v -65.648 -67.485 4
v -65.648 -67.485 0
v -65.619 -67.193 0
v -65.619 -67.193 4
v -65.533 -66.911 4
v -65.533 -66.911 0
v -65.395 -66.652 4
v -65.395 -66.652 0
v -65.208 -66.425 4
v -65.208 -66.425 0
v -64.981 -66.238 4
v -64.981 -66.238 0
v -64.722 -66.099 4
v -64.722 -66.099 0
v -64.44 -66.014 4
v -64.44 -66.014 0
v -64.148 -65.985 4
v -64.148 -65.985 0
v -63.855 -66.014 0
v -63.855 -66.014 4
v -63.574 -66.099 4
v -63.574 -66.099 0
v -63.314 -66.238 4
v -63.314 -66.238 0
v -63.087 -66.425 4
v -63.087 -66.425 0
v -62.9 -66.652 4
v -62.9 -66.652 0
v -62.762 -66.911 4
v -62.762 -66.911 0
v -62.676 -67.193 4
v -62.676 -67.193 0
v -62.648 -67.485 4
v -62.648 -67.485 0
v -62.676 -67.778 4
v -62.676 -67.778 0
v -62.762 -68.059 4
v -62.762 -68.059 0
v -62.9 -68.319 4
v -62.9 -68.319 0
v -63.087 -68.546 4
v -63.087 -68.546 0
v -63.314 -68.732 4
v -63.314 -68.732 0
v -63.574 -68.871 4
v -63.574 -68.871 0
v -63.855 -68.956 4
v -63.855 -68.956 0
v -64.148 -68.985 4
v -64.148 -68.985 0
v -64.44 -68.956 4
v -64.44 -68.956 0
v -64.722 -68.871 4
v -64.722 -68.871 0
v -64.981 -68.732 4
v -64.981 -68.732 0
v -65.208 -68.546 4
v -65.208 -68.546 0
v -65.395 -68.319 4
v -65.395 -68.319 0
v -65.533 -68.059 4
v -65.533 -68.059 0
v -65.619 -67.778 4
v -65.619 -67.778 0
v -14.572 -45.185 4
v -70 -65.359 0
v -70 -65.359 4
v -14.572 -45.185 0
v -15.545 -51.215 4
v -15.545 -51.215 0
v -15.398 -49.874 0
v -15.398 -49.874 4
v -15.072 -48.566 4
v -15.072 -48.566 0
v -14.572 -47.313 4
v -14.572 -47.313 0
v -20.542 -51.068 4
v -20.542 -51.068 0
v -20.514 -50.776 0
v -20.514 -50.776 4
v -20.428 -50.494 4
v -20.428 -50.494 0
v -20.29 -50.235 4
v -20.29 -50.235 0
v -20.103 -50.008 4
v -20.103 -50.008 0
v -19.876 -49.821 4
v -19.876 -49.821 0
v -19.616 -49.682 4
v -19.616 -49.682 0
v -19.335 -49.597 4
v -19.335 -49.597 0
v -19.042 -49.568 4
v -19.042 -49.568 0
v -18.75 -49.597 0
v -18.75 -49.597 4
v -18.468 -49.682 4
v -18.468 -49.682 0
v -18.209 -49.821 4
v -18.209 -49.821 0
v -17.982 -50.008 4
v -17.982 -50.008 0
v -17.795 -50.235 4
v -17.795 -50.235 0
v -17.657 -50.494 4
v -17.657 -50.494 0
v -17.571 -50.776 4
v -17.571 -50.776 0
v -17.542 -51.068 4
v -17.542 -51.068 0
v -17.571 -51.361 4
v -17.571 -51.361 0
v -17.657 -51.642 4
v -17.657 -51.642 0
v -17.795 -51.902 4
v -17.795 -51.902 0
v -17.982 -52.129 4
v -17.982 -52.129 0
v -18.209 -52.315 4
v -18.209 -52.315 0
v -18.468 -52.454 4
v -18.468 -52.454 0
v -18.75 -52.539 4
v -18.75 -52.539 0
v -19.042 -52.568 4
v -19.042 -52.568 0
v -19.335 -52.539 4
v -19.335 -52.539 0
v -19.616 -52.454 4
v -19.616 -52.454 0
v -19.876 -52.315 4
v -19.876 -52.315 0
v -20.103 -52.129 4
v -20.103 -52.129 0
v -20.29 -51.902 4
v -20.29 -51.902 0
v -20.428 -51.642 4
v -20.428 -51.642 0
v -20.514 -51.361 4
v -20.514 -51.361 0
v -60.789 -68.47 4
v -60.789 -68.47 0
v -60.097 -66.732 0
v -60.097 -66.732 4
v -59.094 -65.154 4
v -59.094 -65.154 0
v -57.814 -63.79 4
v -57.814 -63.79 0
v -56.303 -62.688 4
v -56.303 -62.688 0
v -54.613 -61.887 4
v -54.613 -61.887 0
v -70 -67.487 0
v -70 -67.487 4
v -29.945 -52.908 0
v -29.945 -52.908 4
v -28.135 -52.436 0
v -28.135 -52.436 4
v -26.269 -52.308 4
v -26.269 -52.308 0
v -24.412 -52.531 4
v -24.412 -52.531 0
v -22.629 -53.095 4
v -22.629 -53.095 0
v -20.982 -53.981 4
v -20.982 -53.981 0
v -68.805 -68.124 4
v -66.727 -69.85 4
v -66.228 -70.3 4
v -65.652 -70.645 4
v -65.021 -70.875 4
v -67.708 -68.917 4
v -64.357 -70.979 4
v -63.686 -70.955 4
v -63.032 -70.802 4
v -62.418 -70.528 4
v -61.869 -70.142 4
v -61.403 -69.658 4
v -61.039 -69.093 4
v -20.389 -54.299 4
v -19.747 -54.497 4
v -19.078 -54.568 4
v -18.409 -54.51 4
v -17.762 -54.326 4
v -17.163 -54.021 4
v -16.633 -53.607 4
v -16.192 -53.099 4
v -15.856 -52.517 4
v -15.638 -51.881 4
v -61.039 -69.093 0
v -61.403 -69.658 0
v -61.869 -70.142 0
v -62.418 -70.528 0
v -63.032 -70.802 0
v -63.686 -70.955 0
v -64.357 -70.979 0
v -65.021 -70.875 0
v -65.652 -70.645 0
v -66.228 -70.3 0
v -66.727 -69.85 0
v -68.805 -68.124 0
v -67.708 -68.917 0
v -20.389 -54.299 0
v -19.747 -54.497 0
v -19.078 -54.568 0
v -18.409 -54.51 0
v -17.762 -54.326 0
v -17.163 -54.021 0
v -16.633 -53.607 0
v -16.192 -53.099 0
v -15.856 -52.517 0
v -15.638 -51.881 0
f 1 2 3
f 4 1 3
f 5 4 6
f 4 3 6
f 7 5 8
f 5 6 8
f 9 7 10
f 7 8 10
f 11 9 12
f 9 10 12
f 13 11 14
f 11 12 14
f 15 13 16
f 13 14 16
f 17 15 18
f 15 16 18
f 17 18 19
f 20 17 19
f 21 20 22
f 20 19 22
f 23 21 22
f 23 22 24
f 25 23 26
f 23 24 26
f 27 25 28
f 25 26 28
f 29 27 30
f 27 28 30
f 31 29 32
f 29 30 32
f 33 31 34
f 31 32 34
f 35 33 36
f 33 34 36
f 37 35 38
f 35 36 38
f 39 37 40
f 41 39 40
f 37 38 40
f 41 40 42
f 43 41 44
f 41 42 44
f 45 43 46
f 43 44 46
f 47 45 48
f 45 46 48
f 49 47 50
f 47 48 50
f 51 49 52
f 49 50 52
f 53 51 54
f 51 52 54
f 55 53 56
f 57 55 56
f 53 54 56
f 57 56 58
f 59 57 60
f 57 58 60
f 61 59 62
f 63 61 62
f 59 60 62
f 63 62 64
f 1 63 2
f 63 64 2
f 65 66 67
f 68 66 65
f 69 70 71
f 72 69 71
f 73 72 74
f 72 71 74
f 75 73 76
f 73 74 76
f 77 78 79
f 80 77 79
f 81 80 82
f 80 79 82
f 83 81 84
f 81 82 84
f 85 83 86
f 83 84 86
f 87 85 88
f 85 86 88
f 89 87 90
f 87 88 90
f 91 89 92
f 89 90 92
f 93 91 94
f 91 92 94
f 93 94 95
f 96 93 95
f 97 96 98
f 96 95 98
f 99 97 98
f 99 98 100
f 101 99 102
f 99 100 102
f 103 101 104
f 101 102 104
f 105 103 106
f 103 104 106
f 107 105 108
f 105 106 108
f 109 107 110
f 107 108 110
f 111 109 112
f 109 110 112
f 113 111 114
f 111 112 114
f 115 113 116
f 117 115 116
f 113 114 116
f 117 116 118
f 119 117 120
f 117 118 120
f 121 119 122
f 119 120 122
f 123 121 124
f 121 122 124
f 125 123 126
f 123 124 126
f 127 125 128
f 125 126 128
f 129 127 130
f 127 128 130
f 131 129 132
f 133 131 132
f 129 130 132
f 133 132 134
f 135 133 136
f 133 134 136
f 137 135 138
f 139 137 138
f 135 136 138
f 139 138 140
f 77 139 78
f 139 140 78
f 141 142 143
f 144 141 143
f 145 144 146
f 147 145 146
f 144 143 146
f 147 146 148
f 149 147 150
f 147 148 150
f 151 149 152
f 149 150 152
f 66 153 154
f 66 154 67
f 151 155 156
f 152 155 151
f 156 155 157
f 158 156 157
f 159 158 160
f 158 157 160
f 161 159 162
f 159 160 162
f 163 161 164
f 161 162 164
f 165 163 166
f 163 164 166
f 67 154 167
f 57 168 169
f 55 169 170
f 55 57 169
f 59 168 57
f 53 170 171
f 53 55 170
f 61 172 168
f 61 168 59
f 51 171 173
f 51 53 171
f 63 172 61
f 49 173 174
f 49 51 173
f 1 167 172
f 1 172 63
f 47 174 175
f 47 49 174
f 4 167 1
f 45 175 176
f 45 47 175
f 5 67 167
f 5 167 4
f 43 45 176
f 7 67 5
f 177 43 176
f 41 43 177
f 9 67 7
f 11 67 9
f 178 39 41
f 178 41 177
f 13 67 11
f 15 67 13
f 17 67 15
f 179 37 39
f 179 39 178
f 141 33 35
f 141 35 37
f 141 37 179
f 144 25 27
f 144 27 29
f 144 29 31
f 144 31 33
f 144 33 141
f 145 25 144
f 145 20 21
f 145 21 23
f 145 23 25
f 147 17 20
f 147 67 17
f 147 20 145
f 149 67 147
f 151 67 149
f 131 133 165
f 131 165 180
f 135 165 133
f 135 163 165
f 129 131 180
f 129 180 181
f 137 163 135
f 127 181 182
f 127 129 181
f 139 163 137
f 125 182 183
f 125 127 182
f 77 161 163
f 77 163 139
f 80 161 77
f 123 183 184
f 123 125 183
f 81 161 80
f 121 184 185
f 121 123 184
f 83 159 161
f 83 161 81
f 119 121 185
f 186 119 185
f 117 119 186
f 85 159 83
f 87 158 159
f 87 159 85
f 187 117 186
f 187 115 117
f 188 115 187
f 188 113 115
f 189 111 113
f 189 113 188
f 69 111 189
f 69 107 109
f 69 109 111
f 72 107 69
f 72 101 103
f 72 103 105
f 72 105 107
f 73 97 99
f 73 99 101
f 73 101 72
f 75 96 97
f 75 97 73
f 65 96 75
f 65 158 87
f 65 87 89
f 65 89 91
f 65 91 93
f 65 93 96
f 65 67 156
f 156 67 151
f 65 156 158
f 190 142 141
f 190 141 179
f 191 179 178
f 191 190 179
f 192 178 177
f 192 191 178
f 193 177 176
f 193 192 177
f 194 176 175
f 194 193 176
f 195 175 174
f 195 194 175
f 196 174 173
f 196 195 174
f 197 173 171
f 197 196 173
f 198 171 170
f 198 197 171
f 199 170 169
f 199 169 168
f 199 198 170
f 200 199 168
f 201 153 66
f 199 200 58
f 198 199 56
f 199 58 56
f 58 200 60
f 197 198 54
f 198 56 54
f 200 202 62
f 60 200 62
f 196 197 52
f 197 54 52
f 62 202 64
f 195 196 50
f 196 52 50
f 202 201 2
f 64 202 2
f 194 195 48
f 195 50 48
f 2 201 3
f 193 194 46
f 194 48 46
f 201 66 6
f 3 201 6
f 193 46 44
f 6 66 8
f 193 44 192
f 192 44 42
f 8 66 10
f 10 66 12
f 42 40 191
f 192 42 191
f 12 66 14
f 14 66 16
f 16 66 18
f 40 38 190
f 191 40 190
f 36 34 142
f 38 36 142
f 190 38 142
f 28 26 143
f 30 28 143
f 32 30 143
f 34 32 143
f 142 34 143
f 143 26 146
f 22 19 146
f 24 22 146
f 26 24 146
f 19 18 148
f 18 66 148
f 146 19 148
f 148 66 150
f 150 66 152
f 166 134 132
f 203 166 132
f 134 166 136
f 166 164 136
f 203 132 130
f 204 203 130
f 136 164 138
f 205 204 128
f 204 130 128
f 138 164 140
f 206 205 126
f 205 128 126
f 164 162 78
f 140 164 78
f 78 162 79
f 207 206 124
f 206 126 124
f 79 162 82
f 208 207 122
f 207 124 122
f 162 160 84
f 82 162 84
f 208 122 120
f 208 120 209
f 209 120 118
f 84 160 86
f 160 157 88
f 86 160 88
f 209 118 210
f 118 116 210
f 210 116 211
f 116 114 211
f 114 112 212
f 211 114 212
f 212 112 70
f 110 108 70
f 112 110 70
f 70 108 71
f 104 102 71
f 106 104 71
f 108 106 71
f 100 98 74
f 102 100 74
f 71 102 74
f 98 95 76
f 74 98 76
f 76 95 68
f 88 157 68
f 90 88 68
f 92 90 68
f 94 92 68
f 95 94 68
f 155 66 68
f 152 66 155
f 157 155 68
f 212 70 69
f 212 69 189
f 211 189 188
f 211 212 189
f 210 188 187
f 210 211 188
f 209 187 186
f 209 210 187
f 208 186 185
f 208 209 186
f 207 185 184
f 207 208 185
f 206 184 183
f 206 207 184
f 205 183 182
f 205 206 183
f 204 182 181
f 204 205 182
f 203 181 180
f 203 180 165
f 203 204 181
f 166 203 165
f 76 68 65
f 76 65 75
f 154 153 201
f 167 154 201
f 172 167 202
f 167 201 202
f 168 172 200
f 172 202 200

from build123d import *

# Parameters (mm, degrees)
BOSS_EXTRUDE1_DEPTH = 4
SKETCH2_R           = 1.5
BOSS_EXTRUDE2_DEPTH = 4
FILLET1_DEPTH       = 4


with BuildPart() as part:
    # Sketch1 → Boss-Extrude1 (new body)
    with BuildSketch(Plane.XY):
        Polygon((-70, -65.358547654), (-14.572335871, -45.184527756), (-14.572335871, -47.312883301), (-70, -67.486903199), align=None)
    extrude(amount=BOSS_EXTRUDE1_DEPTH)

    # Sketch2 → Boss-Extrude2 (add)
    # profile 1 of 6: a face of its own
    with BuildSketch(Plane(origin=(0, 0, 0), x_dir=(-1, 0, 0), z_dir=(0, 0, -1))):
        with BuildLine():
            ThreePointArc((15.753480329, -49.871140271), (17.845334, -54.357134945), (22.331328674, -52.265281274))
            ThreePointArc((22.331328674, -52.265281274), (22.489231637, -51.675979394), (22.542404501, -51.068210772))
            ThreePointArc((22.542404501, -51.068210772), (22.513056924, -50.615914674), (22.425506352, -50.171203601))
            Line((22.425506352, -50.171203601), (17.027383224, -48.206447461))
            ThreePointArc((17.027383224, -48.206447461), (16.262879385, -48.941184649), (15.753480329, -49.871140271))
        make_face()
        with Locations((19.042404501, -51.068210772)):
            Circle(SKETCH2_R, mode=Mode.SUBTRACT)
    # profile 2 of 6: a face of its own
    with BuildSketch(Plane(origin=(0, 0, 0), x_dir=(-1, 0, 0), z_dir=(0, 0, -1))):
        with BuildLine():
            Line((16.437520615, -47.991755029), (15.753480329, -49.871140271))
            ThreePointArc((15.753480329, -49.871140271), (16.262879385, -48.941184649), (17.027383224, -48.206447461))
            Line((17.027383224, -48.206447461), (16.437520615, -47.991755029))
        make_face()
    # profile 3 of 6: a face of its own
    with BuildSketch(Plane(origin=(0, 0, 0), x_dir=(-1, 0, 0), z_dir=(0, 0, -1))):
        with BuildLine():
            Line((22.331328674, -52.265281274), (23.015368961, -50.385896032))
            Line((23.015368961, -50.385896032), (22.425506352, -50.171203601))
            ThreePointArc((22.425506352, -50.171203601), (22.513056924, -50.615914674), (22.542404501, -51.068210772))
            ThreePointArc((22.542404501, -51.068210772), (22.489231637, -51.675979394), (22.331328674, -52.265281274))
        make_face()
    # profile 4 of 6: a face of its own
    with BuildSketch(Plane(origin=(0, 0, 0), x_dir=(-1, 0, 0), z_dir=(0, 0, -1))):
        with BuildLine():
            ThreePointArc((62.132629021, -64.62341434), (61.368125183, -65.358151529), (60.858726126, -66.28810715))
            ThreePointArc((60.858726126, -66.28810715), (62.950579797, -70.774101825), (67.436574472, -68.682248154))
            ThreePointArc((67.436574472, -68.682248154), (67.594477435, -68.092946274), (67.647650299, -67.485177652))
            ThreePointArc((67.647650299, -67.485177652), (67.618302722, -67.032881553), (67.53075215, -66.58817048))
            Line((67.53075215, -66.58817048), (62.132629021, -64.62341434))
        make_face()
        with Locations((64.147650299, -67.485177652)):
            Circle(SKETCH2_R, mode=Mode.SUBTRACT)
    # profile 5 of 6: a face of its own
    with BuildSketch(Plane(origin=(0, 0, 0), x_dir=(-1, 0, 0), z_dir=(0, 0, -1))):
        with BuildLine():
            Line((62.132629021, -64.62341434), (61.542766413, -64.408721909))
            Line((61.542766413, -64.408721909), (60.858726126, -66.28810715))
            ThreePointArc((60.858726126, -66.28810715), (61.368125183, -65.358151529), (62.132629021, -64.62341434))
        make_face()
    # profile 6 of 6: a face of its own
    with BuildSketch(Plane(origin=(0, 0, 0), x_dir=(-1, 0, 0), z_dir=(0, 0, -1))):
        with BuildLine():
            ThreePointArc((67.647650299, -67.485177652), (67.594477435, -68.092946274), (67.436574472, -68.682248154))
            Line((67.436574472, -68.682248154), (68.120614758, -66.802862912))
            Line((68.120614758, -66.802862912), (67.53075215, -66.58817048))
            ThreePointArc((67.53075215, -66.58817048), (67.618302722, -67.032881553), (67.647650299, -67.485177652))
        make_face()
    extrude(amount=-BOSS_EXTRUDE2_DEPTH)

    # Fillet1: read off the stored shape, not the designer's step
    # Fillet1 outline → Fillet1 (add)
    with BuildSketch(Plane.XY):
        with BuildLine():
            ThreePointArc((-15.753480329, -49.871140271), (-15.583589929, -50.532858787), (-15.545482945, -51.214974613))
            ThreePointArc((-15.545482945, -51.214974613), (-15.257091898, -49.214503996), (-14.572335871, -47.312883301))
            Line((-14.572335871, -47.312883301), (-16.437520615, -47.991755029))
            Line((-16.437520615, -47.991755029), (-15.753480329, -49.871140271))
        make_face()
        with BuildLine():
            Line((-23.015368961, -50.385896032), (-29.94492695, -52.908048877))
            ThreePointArc((-29.94492695, -52.908048877), (-25.335591086, -52.375928842), (-20.982265505, -53.981445964))
            ThreePointArc((-20.982265505, -53.981445964), (-21.794013834, -53.231228591), (-22.331328674, -52.265281274))
            Line((-22.331328674, -52.265281274), (-23.015368961, -50.385896032))
        make_face()
        with BuildLine():
            ThreePointArc((-60.858726126, -66.28810715), (-60.649434207, -67.373445046), (-60.78903907, -68.469926664))
            ThreePointArc((-60.78903907, -68.469926664), (-58.486204715, -64.44176545), (-54.613208423, -61.886569064))
            Line((-54.613208423, -61.886569064), (-61.542766413, -64.408721909))
            Line((-61.542766413, -64.408721909), (-60.858726126, -66.28810715))
        make_face()
        with BuildLine():
            ThreePointArc((-70, -67.486903199), (-68.243205646, -68.501846695), (-66.727429559, -69.850497708))
            ThreePointArc((-66.727429559, -69.850497708), (-67.139576393, -69.301321437), (-67.436574472, -68.682248154))
            Line((-67.436574472, -68.682248154), (-68.120614758, -66.802862912))
            Line((-68.120614758, -66.802862912), (-70, -67.486903199))
        make_face()
    extrude(amount=FILLET1_DEPTH)


solid = part.part
